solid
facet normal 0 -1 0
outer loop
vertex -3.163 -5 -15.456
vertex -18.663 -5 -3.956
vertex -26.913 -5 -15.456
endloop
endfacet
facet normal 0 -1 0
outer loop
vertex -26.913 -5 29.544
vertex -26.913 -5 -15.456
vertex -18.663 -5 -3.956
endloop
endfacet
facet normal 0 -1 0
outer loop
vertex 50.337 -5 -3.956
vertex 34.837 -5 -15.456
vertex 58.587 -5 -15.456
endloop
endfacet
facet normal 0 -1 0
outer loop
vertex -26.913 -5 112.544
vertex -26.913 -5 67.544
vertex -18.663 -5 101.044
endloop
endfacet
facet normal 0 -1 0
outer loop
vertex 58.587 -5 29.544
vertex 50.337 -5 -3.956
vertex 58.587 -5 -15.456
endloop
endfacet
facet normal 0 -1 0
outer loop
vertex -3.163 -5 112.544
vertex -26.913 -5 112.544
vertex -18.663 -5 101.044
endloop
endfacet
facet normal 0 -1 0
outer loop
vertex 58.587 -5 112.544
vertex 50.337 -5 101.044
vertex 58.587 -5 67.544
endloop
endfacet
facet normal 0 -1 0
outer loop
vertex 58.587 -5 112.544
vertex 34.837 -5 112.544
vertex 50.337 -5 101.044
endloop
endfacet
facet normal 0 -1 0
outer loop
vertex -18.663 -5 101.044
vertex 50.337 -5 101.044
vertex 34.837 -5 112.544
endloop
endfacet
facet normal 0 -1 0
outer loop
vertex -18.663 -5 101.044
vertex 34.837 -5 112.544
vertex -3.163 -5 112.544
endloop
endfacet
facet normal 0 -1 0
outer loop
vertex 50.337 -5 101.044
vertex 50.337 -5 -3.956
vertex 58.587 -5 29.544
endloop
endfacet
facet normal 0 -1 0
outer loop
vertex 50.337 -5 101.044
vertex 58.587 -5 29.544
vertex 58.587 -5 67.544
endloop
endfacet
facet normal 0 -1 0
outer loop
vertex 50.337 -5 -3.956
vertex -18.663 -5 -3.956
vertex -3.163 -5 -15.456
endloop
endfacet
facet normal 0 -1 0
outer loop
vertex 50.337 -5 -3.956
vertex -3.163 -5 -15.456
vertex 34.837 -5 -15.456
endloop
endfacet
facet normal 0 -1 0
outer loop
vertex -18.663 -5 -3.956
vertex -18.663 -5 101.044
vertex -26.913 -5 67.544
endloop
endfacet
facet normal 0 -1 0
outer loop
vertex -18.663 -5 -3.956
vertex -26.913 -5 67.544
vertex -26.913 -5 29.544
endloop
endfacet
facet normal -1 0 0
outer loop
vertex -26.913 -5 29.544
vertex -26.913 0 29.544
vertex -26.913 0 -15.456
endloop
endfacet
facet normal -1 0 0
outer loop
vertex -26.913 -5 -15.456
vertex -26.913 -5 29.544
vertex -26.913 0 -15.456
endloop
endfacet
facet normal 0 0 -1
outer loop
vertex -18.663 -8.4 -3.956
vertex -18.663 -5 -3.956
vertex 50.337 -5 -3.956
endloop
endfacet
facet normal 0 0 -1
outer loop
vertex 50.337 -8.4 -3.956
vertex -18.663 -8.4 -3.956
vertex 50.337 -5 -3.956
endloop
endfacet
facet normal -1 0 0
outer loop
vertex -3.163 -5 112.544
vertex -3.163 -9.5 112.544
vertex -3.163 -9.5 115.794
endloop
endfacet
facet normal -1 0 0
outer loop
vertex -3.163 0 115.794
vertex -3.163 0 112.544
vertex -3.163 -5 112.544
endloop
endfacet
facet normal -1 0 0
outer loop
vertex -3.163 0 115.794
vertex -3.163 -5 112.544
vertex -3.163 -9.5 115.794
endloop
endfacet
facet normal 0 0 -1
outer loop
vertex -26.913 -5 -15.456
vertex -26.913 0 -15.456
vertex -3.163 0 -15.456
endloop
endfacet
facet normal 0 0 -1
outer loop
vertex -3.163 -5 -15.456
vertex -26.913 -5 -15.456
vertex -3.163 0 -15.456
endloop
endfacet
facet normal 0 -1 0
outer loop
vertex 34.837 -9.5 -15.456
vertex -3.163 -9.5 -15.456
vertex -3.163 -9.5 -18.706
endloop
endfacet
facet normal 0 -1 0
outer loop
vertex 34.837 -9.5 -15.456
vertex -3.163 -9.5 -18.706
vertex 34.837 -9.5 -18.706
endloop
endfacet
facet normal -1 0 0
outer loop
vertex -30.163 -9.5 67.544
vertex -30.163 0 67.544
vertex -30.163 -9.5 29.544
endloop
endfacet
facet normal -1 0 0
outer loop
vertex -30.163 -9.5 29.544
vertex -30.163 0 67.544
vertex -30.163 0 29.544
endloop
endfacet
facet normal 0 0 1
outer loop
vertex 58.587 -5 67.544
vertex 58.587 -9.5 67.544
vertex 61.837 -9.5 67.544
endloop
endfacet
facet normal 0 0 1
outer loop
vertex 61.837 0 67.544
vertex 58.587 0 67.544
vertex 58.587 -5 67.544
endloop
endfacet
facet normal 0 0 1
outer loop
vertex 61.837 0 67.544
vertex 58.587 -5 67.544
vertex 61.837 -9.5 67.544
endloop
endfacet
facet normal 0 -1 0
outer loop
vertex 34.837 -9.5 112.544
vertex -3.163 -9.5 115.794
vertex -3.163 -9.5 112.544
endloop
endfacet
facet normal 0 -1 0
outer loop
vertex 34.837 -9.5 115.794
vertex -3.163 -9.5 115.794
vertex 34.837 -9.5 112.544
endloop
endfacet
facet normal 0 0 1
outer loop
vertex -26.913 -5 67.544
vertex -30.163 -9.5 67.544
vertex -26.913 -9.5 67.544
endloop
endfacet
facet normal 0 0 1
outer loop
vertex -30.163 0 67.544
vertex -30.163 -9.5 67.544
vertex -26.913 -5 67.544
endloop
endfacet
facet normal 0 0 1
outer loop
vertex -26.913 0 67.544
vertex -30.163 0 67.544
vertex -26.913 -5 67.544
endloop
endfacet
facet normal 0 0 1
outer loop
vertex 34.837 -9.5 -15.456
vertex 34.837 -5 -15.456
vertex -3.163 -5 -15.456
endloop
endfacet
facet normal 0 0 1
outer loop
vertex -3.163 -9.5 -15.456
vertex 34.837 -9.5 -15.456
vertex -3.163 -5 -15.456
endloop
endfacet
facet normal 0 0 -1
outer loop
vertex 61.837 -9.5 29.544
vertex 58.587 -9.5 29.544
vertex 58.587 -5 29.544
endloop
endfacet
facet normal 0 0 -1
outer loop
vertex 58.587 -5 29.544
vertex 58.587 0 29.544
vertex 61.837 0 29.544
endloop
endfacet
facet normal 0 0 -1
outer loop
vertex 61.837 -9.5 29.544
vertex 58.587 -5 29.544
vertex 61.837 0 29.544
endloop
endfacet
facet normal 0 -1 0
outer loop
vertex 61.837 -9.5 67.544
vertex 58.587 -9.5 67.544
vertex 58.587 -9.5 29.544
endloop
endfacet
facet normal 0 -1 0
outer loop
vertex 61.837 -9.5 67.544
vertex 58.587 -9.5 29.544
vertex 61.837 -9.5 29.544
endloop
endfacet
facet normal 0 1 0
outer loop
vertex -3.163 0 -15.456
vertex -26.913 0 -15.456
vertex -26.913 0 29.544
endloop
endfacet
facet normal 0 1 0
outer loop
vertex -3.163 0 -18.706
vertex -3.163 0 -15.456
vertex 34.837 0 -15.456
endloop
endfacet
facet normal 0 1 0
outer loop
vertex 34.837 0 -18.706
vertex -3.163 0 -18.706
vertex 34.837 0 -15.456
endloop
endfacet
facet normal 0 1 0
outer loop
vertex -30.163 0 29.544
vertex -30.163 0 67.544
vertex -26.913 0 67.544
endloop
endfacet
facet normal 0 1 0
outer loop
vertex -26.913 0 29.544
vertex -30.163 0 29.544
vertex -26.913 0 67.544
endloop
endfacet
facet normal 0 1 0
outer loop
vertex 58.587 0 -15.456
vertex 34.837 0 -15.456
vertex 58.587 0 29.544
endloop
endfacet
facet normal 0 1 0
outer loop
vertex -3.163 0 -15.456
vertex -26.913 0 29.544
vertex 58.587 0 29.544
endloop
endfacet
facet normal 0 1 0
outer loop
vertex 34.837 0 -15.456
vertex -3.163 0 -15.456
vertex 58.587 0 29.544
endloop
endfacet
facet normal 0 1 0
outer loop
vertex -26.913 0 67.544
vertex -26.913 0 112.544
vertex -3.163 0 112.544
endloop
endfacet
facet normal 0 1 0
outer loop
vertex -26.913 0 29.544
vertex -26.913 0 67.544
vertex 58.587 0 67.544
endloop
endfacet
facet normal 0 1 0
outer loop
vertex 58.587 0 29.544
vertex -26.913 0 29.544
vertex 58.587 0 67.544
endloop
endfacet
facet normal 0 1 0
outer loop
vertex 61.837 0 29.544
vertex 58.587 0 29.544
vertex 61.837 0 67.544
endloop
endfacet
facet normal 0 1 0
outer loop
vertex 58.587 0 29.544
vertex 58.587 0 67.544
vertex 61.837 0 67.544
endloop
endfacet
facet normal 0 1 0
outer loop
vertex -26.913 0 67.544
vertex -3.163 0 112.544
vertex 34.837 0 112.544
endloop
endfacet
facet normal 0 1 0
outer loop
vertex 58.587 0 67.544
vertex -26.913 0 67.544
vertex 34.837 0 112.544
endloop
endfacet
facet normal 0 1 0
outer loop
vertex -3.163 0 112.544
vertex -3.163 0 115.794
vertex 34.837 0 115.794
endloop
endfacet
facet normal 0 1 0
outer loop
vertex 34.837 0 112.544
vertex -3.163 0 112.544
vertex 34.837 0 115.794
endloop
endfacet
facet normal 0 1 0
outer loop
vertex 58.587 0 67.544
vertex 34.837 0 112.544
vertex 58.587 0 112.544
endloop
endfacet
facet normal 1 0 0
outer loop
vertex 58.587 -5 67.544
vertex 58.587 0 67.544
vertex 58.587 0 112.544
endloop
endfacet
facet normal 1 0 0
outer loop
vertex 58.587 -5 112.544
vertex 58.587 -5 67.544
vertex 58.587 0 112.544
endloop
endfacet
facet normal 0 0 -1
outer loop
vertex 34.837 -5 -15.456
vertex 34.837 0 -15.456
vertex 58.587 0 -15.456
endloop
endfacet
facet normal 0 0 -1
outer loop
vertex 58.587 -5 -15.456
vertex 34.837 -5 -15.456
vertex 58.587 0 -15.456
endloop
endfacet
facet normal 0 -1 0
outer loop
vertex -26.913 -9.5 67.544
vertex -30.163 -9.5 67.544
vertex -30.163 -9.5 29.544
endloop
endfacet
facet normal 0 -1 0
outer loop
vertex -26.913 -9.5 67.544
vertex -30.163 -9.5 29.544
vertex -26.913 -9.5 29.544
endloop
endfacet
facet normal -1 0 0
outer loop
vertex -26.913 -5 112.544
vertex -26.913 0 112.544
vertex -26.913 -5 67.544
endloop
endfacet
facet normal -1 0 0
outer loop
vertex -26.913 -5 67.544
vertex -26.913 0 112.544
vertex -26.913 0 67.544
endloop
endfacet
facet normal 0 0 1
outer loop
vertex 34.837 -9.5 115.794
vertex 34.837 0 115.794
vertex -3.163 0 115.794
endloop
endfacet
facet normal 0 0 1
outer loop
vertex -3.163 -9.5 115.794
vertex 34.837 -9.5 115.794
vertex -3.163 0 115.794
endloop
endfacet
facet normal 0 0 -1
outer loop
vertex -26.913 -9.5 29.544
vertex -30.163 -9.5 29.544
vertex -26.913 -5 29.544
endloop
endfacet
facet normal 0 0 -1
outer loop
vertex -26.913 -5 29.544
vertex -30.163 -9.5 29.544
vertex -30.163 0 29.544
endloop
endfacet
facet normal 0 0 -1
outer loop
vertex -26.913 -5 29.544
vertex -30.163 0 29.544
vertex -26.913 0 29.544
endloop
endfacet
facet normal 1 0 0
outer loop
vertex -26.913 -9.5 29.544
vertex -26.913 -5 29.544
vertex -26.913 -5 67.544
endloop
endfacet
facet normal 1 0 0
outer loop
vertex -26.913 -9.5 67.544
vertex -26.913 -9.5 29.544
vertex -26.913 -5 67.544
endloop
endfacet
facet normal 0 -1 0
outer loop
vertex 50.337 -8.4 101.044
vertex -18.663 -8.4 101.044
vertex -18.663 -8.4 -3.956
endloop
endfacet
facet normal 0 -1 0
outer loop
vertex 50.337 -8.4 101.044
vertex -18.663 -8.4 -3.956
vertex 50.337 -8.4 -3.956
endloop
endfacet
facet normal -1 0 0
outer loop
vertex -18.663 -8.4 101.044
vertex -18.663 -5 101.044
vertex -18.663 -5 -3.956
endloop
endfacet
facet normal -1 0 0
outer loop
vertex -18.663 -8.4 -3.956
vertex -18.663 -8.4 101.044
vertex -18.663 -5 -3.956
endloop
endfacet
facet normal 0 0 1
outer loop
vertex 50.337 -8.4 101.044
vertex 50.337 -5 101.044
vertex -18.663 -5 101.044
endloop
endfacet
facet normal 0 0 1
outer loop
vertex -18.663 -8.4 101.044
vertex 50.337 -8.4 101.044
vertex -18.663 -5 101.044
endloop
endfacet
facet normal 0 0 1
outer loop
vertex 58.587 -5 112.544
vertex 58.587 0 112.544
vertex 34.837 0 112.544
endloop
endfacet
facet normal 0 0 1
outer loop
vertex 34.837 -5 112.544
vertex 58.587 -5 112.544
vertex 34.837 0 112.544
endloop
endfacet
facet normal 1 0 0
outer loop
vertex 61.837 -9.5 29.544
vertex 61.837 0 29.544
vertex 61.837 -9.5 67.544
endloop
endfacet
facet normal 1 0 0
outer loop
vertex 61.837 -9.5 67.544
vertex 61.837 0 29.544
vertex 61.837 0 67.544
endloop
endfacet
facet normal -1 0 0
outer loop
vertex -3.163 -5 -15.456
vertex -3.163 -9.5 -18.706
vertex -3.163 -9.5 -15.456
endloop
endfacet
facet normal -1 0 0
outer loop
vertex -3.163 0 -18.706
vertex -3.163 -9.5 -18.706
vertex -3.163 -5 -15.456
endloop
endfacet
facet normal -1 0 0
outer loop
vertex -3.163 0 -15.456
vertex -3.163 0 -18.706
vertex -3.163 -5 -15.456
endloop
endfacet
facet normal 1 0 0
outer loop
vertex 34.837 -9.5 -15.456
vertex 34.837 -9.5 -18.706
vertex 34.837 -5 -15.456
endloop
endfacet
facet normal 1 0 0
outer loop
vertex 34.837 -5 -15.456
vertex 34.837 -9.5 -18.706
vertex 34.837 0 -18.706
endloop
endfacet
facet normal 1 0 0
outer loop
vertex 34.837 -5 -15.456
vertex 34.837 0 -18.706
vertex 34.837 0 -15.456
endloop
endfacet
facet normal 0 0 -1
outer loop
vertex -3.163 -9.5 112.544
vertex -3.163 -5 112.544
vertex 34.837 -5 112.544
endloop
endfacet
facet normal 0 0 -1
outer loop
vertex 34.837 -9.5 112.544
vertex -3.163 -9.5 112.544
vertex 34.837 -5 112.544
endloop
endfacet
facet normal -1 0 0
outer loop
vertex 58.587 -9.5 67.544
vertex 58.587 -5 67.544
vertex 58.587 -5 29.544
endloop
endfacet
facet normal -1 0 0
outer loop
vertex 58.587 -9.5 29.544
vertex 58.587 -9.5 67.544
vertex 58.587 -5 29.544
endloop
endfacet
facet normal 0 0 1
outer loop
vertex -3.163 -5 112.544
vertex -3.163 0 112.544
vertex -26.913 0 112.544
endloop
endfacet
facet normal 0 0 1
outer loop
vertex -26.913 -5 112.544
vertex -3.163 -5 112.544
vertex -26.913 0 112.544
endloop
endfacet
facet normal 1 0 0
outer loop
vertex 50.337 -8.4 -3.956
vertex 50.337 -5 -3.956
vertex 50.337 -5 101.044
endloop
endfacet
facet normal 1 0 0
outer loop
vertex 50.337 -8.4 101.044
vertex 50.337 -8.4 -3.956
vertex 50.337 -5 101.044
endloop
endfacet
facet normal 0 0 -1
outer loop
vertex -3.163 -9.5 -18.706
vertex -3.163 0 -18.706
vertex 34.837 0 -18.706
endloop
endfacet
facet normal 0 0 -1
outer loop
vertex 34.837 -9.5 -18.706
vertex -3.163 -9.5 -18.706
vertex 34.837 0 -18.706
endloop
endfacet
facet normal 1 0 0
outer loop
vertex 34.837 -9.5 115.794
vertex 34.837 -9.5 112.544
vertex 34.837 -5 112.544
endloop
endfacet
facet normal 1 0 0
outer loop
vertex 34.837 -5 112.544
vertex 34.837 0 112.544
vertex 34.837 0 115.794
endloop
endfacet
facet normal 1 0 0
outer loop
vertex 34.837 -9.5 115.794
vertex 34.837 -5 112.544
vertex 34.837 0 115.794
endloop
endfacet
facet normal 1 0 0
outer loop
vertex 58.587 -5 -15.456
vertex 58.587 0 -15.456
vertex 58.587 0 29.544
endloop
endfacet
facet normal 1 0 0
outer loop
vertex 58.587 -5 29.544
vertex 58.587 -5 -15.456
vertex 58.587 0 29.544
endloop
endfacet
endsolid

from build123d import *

# Parameters (mm, degrees)
F1_DEPTH = 5
F0_W     = 34.5
F0_H     = 52.5
F2_DEPTH = 8.4
F0_W_2   = 3.25
F0_H_2   = 19
F0_W_3   = 19
F0_H_3   = 3.25
F3_DEPTH = 9.5


with BuildPart() as f1:
    # F0 (on Front) → F1 (new body)
    with BuildSketch(Plane.XZ):
        Polygon((-3.162847, 112.5443), (-26.912847, 112.5443), (-26.912847, 67.5443), (-26.912847, 48.5443), (-18.662847, 48.5443), (-18.662847, 101.0443), (15.837153, 101.0443), (15.837153, 112.5443), align=None)
        Polygon((34.837153, 112.5443), (15.837153, 112.5443), (15.837153, 101.0443), (50.337153, 101.0443), (50.337153, 48.5443), (58.587153, 48.5443), (58.587153, 67.5443), (58.587153, 112.5443), align=None)
        Polygon((58.587153, 48.5443), (50.337153, 48.5443), (50.337153, -3.9557), (15.837153, -3.9557), (15.837153, -15.4557), (34.837153, -15.4557), (58.587153, -15.4557), (58.587153, 29.5443), align=None)
        Polygon((-18.662847, 48.5443), (-26.912847, 48.5443), (-26.912847, 29.5443), (-26.912847, -15.4557), (-3.162847, -15.4557), (15.837153, -15.4557), (15.837153, -3.9557), (-18.662847, -3.9557), align=None)
    extrude(amount=F1_DEPTH)

    # F0 (on Front) → F2 (join)
    with BuildSketch(Plane.XZ):
        with Locations((-1.412847, 74.7943)):
            Rectangle(F0_W, F0_H)
        with Locations((33.087153, 74.7943)):
            Rectangle(F0_W, F0_H)
        with Locations((33.087153, 22.2943)):
            Rectangle(F0_W, F0_H)
        with Locations((-1.412847, 22.2943)):
            Rectangle(F0_W, F0_H)
    extrude(amount=F2_DEPTH)

    # F0 (on Front) → F3 (join)
    with BuildSketch(Plane.XZ):
        with Locations((-28.537847, 58.0443)):
            Rectangle(F0_W_2, F0_H_2)
        with Locations((-28.537847, 39.0443)):
            Rectangle(F0_W_2, F0_H_2)
        with Locations((6.337153, 114.1693)):
            Rectangle(F0_W_3, F0_H_3)
        with Locations((25.337153, 114.1693)):
            Rectangle(F0_W_3, F0_H_3)
        with Locations((60.212153, 58.0443)):
            Rectangle(F0_W_2, F0_H_2)
        with Locations((60.212153, 39.0443)):
            Rectangle(F0_W_2, F0_H_2)
        with Locations((25.337153, -17.0807)):
            Rectangle(F0_W_3, F0_H_3)
        with Locations((6.337153, -17.0807)):
            Rectangle(F0_W_3, F0_H_3)
    extrude(amount=F3_DEPTH)


solid = f1.part
